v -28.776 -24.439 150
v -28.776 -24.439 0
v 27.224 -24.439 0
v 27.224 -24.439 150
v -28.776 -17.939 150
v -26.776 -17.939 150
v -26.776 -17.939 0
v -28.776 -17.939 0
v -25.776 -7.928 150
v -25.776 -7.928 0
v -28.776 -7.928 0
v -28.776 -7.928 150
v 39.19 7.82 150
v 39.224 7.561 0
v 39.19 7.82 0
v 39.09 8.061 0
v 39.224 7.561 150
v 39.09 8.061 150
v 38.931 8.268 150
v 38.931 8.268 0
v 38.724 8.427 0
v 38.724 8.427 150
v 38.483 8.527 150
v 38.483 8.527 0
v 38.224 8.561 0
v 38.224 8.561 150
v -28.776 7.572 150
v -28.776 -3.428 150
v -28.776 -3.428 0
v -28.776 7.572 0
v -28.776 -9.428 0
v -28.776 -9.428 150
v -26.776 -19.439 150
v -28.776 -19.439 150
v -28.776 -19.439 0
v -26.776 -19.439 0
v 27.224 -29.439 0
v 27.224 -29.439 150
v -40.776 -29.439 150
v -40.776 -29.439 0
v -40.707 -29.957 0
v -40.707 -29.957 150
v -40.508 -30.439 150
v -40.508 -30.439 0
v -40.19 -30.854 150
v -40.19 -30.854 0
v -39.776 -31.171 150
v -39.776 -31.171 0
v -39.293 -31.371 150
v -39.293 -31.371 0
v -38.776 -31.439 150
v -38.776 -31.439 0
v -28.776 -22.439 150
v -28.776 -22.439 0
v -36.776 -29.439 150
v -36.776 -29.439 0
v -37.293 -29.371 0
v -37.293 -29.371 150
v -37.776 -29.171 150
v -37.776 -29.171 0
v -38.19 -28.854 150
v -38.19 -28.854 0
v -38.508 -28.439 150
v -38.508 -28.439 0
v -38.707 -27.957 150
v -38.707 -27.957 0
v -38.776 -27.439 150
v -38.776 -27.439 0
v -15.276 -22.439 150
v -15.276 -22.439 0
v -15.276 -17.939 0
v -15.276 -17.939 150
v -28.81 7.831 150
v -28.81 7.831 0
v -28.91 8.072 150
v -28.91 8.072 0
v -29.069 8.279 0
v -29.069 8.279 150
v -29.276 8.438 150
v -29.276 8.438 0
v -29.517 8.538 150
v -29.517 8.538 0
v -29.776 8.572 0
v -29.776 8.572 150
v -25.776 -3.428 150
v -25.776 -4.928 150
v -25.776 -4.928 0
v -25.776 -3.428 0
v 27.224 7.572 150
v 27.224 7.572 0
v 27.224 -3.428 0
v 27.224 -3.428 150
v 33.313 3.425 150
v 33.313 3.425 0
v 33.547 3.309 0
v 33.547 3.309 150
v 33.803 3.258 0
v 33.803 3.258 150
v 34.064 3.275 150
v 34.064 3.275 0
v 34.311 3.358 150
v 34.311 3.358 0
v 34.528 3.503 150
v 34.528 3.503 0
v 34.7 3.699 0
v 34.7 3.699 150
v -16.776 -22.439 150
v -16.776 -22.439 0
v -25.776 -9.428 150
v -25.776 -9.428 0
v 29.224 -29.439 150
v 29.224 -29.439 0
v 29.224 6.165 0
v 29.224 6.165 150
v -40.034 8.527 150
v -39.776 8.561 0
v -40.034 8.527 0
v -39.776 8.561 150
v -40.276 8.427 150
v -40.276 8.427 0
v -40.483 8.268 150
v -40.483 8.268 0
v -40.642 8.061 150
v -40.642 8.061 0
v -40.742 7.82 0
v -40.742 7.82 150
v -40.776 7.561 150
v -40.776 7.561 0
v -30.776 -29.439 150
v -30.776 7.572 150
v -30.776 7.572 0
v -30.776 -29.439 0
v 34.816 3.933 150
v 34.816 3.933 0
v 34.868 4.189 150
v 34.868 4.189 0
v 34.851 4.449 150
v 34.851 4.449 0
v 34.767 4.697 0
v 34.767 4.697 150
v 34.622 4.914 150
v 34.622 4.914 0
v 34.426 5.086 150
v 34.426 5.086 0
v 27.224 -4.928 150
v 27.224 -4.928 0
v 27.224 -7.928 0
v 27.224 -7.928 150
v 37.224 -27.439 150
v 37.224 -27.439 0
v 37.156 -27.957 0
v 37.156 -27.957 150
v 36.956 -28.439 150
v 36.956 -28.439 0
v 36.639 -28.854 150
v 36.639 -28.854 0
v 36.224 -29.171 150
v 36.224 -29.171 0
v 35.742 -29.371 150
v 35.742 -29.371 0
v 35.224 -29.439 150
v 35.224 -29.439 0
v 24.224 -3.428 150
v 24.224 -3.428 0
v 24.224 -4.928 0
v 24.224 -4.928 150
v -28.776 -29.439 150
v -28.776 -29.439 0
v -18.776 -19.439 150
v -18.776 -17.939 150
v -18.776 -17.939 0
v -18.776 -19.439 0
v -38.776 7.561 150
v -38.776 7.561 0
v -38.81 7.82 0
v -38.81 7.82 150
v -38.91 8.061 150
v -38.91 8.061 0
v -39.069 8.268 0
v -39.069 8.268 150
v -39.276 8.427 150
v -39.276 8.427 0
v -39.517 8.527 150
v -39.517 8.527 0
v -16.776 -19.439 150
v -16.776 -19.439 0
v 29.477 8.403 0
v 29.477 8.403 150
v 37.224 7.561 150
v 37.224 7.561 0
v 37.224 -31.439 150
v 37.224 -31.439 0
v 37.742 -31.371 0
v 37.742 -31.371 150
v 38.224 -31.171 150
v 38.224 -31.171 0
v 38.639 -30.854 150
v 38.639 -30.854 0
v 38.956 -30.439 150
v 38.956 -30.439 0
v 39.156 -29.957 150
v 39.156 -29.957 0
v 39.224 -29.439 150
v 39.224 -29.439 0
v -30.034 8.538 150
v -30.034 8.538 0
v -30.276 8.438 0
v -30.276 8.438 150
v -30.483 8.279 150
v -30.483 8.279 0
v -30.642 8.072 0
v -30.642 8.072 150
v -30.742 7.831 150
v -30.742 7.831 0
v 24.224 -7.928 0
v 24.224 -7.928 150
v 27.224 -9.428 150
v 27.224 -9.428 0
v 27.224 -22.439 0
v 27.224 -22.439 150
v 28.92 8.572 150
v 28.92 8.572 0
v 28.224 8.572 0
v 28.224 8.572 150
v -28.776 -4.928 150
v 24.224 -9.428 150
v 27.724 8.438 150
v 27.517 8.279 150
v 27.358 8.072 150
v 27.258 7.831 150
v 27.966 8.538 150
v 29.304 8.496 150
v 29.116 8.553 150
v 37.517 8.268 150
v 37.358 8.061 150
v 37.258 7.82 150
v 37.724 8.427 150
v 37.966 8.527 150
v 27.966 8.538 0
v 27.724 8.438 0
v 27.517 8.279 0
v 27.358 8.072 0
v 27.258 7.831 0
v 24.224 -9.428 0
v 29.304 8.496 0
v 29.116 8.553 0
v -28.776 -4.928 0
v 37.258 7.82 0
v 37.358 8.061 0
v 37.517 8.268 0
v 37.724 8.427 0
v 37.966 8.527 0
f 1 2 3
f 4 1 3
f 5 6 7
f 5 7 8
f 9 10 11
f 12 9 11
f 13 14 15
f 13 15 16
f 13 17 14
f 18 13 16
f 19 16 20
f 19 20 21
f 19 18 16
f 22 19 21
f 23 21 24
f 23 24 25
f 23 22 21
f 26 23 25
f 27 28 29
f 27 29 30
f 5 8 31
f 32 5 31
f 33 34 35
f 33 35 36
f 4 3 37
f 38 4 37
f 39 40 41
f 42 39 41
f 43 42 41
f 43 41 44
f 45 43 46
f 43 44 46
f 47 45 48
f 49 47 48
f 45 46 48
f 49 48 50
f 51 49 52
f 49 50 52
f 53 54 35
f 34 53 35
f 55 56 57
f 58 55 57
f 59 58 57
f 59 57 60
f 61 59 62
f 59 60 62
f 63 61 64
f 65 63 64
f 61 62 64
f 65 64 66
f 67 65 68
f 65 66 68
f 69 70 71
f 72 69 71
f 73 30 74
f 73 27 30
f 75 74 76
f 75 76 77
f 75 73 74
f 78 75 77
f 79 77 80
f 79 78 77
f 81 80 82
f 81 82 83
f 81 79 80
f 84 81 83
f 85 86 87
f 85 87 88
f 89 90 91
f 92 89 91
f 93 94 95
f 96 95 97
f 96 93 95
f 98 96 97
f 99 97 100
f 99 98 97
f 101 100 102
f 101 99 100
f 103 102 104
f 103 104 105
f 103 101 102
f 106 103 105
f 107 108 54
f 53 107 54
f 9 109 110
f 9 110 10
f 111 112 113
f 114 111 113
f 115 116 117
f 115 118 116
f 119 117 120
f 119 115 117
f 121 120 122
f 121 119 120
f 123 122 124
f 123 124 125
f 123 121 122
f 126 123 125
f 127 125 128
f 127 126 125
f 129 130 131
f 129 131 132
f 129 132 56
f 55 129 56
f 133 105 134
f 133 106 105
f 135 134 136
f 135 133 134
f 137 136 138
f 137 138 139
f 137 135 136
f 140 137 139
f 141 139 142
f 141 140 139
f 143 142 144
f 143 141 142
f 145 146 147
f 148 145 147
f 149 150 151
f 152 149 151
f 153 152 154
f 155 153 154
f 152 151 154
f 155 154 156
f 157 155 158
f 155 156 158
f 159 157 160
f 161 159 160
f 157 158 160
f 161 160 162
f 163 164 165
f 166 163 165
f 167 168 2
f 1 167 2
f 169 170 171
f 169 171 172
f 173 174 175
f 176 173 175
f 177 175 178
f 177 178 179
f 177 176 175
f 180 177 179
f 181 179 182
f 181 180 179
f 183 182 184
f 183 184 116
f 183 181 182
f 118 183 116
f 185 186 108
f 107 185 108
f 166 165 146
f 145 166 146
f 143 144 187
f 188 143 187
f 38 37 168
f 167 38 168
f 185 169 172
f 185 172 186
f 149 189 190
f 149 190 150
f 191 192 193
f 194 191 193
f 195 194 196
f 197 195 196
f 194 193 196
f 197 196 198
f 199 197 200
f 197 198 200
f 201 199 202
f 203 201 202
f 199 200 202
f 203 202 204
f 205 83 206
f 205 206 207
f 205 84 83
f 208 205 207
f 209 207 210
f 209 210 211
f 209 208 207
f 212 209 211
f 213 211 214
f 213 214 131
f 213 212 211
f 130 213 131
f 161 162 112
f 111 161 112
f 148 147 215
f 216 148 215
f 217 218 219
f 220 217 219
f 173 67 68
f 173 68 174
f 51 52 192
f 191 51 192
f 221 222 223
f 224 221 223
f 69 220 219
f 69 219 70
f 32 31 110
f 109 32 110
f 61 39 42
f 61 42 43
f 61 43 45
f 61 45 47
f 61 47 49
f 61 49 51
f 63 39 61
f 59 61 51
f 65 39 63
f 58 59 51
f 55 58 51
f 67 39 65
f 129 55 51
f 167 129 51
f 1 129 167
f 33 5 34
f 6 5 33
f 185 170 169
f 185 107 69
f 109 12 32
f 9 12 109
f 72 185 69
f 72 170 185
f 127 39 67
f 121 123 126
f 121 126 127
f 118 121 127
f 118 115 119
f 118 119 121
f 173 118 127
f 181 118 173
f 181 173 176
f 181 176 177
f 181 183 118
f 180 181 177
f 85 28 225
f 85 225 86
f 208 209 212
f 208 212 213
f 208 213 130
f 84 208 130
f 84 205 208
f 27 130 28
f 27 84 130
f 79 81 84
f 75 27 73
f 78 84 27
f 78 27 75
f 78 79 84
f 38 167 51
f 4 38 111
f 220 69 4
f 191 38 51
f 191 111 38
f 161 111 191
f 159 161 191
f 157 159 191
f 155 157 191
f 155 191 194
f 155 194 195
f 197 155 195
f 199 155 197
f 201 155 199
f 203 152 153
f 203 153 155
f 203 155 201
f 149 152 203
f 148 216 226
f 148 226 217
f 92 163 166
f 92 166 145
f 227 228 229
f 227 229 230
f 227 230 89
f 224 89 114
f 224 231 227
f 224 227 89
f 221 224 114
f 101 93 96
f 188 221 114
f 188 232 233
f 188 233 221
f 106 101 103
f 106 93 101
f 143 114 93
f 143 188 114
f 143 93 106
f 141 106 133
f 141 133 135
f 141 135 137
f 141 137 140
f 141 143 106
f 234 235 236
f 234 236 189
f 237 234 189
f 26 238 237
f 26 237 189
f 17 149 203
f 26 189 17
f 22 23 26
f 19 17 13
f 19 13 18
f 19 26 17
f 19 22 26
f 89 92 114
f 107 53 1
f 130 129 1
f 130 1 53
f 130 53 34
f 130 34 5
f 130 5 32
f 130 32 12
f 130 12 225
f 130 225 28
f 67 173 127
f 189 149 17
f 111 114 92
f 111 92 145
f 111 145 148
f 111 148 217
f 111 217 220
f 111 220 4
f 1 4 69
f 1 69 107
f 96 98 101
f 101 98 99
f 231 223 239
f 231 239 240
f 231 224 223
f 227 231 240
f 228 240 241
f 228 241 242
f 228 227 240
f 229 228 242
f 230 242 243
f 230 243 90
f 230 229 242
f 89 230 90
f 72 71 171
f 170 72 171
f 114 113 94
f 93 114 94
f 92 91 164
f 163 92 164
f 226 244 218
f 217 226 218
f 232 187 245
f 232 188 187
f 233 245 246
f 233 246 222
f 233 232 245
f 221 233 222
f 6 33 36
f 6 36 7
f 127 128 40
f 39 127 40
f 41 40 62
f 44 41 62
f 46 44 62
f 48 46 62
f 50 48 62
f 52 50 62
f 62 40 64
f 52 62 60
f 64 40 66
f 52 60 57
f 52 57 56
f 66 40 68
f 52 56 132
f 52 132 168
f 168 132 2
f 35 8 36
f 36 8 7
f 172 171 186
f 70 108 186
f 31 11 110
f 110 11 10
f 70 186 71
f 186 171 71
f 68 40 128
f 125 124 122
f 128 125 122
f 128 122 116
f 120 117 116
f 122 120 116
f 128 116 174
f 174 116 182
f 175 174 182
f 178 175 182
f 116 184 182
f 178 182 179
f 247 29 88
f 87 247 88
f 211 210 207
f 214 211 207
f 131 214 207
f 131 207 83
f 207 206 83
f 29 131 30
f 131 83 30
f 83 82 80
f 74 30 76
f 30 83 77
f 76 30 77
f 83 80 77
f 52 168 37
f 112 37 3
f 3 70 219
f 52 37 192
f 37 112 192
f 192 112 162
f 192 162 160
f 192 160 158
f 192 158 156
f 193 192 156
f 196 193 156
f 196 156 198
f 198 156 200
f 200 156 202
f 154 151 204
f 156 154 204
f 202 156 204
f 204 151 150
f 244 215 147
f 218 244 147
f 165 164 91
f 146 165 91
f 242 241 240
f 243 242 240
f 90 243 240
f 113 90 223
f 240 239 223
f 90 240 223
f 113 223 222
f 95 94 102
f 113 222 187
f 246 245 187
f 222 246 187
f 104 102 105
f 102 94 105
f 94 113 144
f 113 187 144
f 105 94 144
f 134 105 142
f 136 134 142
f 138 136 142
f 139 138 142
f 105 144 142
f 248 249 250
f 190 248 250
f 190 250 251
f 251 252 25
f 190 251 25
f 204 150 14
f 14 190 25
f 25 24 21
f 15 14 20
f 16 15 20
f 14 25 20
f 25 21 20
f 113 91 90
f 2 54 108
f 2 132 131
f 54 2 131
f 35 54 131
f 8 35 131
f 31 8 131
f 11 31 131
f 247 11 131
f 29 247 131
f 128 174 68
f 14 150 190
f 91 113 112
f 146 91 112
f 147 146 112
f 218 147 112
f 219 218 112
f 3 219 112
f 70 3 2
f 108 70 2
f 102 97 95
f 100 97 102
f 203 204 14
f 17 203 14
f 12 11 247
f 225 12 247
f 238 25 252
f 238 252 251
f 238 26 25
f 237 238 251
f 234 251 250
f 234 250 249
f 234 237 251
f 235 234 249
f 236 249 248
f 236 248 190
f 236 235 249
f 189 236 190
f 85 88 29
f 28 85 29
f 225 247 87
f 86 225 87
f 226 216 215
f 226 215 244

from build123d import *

# Parameters (mm, degrees)
F1_DEPTH = 150
F2_R     = 0.99999


# Not quite as in the source:
# - a fillet or chamfer is up to 0.001 mm smaller than in the source, because OpenCascade refuses the exact size


with BuildPart() as f1:
    # F0 (on Top) → F1 (new body)
    with BuildSketch(Plane.XY):
        Polygon((29.2243703455, 8.5721745163), (29.2243703455, 6.1646732221), (34.1438145412, 2.8682211694), (35.2571452463, 4.5296948349), align=None)
        with BuildLine():
            ThreePointArc((-40.7756296545, -29.4393073201), (-40.1898432169, -30.8535208825), (-38.7756296545, -31.4393073201))
            Line((-38.7756296545, -31.4393073201), (37.2243703455, -31.4393073201))
            ThreePointArc((37.2243703455, -31.4393073201), (38.6385839078, -30.8535208825), (39.2243703455, -29.4393073201))
            Line((39.2243703455, -29.4393073201), (39.2243703455, 8.5606926799))
            Line((39.2243703455, 8.5606926799), (37.2243703455, 8.5606926799))
            Line((37.2243703455, 8.5606926799), (37.2243703455, -27.4393073201))
            ThreePointArc((37.2243703455, -27.4393073201), (36.6385839078, -28.8535208825), (35.2243703455, -29.4393073201))
            Line((35.2243703455, -29.4393073201), (29.2243703455, -29.4393073201))
            Line((29.2243703455, -29.4393073201), (29.2243703455, 6.1646732221))
            Line((29.2243703455, 6.1646732221), (29.2243703455, 8.5721745163))
            Line((29.2243703455, 8.5721745163), (27.2243703455, 8.5721745163))
            Line((27.2243703455, 8.5721745163), (27.2243703455, -3.4278254837))
            Line((27.2243703455, -3.4278254837), (24.2243703455, -3.4278254837))
            Line((24.2243703455, -3.4278254837), (24.2243703455, -4.9278254837))
            Line((24.2243703455, -4.9278254837), (27.2243703455, -4.9278254837))
            Line((27.2243703455, -4.9278254837), (27.2243703455, -7.9278254837))
            Line((27.2243703455, -7.9278254837), (24.2243703455, -7.9278254837))
            Line((24.2243703455, -7.9278254837), (24.2243703455, -9.4278254837))
            Line((24.2243703455, -9.4278254837), (27.2243703455, -9.4278254837))
            Line((27.2243703455, -9.4278254837), (27.2243703455, -22.4393073201))
            Line((27.2243703455, -22.4393073201), (-15.2756296545, -22.4393073201))
            Line((-15.2756296545, -22.4393073201), (-15.2756296545, -17.9393073201))
            Line((-15.2756296545, -17.9393073201), (-18.7756296545, -17.9393073201))
            Line((-18.7756296545, -17.9393073201), (-18.7756296545, -19.4393073201))
            Line((-18.7756296545, -19.4393073201), (-16.7756296545, -19.4393073201))
            Line((-16.7756296545, -19.4393073201), (-16.7756296545, -22.4393073201))
            Line((-16.7756296545, -22.4393073201), (-28.7756296545, -22.4393073201))
            Line((-28.7756296545, -22.4393073201), (-28.7756296545, -19.4393073201))
            Line((-28.7756296545, -19.4393073201), (-26.7756296545, -19.4393073201))
            Line((-26.7756296545, -19.4393073201), (-26.7756296545, -17.9393073201))
            Line((-26.7756296545, -17.9393073201), (-28.7756296545, -17.9393073201))
            Line((-28.7756296545, -17.9393073201), (-28.7756296545, -9.4278254837))
            Line((-28.7756296545, -9.4278254837), (-25.7756296545, -9.4278254837))
            Line((-25.7756296545, -9.4278254837), (-25.7756296545, -7.9278254837))
            Line((-25.7756296545, -7.9278254837), (-28.7756296545, -7.9278254837))
            Line((-28.7756296545, -7.9278254837), (-28.7756296545, -4.9278254837))
            Line((-28.7756296545, -4.9278254837), (-25.7756296545, -4.9278254837))
            Line((-25.7756296545, -4.9278254837), (-25.7756296545, -3.4278254837))
            Line((-25.7756296545, -3.4278254837), (-28.7756296545, -3.4278254837))
            Line((-28.7756296545, -3.4278254837), (-28.7756296545, 8.5721745163))
            Line((-28.7756296545, 8.5721745163), (-30.7756296545, 8.5721745163))
            Line((-30.7756296545, 8.5721745163), (-30.7756296545, -29.4393073201))
            Line((-30.7756296545, -29.4393073201), (-36.7756296545, -29.4393073201))
            ThreePointArc((-36.7756296545, -29.4393073201), (-38.1898432169, -28.8535208825), (-38.7756296545, -27.4393073201))
            Line((-38.7756296545, -27.4393073201), (-38.7756296545, 8.5606926799))
            Line((-38.7756296545, 8.5606926799), (-40.7756296545, 8.5606926799))
            Line((-40.7756296545, 8.5606926799), (-40.7756296545, -29.4393073201))
        make_face()
        Polygon((-28.7756296545, -24.4393073201), (27.2243703455, -24.4393073201), (27.2243703455, -29.4393073201), (-15.2756296545, -29.4393073201), (-16.7756296545, -29.4393073201), (-28.7756296545, -29.4393073201), (-28.7756296545, -26.4393073201), (-28.7756296545, -24.9393073201), align=None, mode=Mode.SUBTRACT)
    extrude(amount=F1_DEPTH)

    # F2 (radius 1 in the source; OpenCascade refuses exactly that, so slightly less here)
    f2_edges = [f1.edges().sort_by_distance(p)[0] for p in [
        (-40.77563, 8.560693, 75),
        (-38.77563, 8.560693, 75),
        (-30.77563, 8.572175, 75),
        (-28.77563, 8.572175, 75),
        (27.22437, 8.572175, 75),
        (29.22437, 8.572175, 75),
        (35.257145, 4.529695, 75),
        (34.143815, 2.868221, 75),
        (37.22437, 8.560693, 75),
        (39.22437, 8.560693, 75),
    ]]
    fillet(f2_edges, radius=F2_R)


solid = f1.part
